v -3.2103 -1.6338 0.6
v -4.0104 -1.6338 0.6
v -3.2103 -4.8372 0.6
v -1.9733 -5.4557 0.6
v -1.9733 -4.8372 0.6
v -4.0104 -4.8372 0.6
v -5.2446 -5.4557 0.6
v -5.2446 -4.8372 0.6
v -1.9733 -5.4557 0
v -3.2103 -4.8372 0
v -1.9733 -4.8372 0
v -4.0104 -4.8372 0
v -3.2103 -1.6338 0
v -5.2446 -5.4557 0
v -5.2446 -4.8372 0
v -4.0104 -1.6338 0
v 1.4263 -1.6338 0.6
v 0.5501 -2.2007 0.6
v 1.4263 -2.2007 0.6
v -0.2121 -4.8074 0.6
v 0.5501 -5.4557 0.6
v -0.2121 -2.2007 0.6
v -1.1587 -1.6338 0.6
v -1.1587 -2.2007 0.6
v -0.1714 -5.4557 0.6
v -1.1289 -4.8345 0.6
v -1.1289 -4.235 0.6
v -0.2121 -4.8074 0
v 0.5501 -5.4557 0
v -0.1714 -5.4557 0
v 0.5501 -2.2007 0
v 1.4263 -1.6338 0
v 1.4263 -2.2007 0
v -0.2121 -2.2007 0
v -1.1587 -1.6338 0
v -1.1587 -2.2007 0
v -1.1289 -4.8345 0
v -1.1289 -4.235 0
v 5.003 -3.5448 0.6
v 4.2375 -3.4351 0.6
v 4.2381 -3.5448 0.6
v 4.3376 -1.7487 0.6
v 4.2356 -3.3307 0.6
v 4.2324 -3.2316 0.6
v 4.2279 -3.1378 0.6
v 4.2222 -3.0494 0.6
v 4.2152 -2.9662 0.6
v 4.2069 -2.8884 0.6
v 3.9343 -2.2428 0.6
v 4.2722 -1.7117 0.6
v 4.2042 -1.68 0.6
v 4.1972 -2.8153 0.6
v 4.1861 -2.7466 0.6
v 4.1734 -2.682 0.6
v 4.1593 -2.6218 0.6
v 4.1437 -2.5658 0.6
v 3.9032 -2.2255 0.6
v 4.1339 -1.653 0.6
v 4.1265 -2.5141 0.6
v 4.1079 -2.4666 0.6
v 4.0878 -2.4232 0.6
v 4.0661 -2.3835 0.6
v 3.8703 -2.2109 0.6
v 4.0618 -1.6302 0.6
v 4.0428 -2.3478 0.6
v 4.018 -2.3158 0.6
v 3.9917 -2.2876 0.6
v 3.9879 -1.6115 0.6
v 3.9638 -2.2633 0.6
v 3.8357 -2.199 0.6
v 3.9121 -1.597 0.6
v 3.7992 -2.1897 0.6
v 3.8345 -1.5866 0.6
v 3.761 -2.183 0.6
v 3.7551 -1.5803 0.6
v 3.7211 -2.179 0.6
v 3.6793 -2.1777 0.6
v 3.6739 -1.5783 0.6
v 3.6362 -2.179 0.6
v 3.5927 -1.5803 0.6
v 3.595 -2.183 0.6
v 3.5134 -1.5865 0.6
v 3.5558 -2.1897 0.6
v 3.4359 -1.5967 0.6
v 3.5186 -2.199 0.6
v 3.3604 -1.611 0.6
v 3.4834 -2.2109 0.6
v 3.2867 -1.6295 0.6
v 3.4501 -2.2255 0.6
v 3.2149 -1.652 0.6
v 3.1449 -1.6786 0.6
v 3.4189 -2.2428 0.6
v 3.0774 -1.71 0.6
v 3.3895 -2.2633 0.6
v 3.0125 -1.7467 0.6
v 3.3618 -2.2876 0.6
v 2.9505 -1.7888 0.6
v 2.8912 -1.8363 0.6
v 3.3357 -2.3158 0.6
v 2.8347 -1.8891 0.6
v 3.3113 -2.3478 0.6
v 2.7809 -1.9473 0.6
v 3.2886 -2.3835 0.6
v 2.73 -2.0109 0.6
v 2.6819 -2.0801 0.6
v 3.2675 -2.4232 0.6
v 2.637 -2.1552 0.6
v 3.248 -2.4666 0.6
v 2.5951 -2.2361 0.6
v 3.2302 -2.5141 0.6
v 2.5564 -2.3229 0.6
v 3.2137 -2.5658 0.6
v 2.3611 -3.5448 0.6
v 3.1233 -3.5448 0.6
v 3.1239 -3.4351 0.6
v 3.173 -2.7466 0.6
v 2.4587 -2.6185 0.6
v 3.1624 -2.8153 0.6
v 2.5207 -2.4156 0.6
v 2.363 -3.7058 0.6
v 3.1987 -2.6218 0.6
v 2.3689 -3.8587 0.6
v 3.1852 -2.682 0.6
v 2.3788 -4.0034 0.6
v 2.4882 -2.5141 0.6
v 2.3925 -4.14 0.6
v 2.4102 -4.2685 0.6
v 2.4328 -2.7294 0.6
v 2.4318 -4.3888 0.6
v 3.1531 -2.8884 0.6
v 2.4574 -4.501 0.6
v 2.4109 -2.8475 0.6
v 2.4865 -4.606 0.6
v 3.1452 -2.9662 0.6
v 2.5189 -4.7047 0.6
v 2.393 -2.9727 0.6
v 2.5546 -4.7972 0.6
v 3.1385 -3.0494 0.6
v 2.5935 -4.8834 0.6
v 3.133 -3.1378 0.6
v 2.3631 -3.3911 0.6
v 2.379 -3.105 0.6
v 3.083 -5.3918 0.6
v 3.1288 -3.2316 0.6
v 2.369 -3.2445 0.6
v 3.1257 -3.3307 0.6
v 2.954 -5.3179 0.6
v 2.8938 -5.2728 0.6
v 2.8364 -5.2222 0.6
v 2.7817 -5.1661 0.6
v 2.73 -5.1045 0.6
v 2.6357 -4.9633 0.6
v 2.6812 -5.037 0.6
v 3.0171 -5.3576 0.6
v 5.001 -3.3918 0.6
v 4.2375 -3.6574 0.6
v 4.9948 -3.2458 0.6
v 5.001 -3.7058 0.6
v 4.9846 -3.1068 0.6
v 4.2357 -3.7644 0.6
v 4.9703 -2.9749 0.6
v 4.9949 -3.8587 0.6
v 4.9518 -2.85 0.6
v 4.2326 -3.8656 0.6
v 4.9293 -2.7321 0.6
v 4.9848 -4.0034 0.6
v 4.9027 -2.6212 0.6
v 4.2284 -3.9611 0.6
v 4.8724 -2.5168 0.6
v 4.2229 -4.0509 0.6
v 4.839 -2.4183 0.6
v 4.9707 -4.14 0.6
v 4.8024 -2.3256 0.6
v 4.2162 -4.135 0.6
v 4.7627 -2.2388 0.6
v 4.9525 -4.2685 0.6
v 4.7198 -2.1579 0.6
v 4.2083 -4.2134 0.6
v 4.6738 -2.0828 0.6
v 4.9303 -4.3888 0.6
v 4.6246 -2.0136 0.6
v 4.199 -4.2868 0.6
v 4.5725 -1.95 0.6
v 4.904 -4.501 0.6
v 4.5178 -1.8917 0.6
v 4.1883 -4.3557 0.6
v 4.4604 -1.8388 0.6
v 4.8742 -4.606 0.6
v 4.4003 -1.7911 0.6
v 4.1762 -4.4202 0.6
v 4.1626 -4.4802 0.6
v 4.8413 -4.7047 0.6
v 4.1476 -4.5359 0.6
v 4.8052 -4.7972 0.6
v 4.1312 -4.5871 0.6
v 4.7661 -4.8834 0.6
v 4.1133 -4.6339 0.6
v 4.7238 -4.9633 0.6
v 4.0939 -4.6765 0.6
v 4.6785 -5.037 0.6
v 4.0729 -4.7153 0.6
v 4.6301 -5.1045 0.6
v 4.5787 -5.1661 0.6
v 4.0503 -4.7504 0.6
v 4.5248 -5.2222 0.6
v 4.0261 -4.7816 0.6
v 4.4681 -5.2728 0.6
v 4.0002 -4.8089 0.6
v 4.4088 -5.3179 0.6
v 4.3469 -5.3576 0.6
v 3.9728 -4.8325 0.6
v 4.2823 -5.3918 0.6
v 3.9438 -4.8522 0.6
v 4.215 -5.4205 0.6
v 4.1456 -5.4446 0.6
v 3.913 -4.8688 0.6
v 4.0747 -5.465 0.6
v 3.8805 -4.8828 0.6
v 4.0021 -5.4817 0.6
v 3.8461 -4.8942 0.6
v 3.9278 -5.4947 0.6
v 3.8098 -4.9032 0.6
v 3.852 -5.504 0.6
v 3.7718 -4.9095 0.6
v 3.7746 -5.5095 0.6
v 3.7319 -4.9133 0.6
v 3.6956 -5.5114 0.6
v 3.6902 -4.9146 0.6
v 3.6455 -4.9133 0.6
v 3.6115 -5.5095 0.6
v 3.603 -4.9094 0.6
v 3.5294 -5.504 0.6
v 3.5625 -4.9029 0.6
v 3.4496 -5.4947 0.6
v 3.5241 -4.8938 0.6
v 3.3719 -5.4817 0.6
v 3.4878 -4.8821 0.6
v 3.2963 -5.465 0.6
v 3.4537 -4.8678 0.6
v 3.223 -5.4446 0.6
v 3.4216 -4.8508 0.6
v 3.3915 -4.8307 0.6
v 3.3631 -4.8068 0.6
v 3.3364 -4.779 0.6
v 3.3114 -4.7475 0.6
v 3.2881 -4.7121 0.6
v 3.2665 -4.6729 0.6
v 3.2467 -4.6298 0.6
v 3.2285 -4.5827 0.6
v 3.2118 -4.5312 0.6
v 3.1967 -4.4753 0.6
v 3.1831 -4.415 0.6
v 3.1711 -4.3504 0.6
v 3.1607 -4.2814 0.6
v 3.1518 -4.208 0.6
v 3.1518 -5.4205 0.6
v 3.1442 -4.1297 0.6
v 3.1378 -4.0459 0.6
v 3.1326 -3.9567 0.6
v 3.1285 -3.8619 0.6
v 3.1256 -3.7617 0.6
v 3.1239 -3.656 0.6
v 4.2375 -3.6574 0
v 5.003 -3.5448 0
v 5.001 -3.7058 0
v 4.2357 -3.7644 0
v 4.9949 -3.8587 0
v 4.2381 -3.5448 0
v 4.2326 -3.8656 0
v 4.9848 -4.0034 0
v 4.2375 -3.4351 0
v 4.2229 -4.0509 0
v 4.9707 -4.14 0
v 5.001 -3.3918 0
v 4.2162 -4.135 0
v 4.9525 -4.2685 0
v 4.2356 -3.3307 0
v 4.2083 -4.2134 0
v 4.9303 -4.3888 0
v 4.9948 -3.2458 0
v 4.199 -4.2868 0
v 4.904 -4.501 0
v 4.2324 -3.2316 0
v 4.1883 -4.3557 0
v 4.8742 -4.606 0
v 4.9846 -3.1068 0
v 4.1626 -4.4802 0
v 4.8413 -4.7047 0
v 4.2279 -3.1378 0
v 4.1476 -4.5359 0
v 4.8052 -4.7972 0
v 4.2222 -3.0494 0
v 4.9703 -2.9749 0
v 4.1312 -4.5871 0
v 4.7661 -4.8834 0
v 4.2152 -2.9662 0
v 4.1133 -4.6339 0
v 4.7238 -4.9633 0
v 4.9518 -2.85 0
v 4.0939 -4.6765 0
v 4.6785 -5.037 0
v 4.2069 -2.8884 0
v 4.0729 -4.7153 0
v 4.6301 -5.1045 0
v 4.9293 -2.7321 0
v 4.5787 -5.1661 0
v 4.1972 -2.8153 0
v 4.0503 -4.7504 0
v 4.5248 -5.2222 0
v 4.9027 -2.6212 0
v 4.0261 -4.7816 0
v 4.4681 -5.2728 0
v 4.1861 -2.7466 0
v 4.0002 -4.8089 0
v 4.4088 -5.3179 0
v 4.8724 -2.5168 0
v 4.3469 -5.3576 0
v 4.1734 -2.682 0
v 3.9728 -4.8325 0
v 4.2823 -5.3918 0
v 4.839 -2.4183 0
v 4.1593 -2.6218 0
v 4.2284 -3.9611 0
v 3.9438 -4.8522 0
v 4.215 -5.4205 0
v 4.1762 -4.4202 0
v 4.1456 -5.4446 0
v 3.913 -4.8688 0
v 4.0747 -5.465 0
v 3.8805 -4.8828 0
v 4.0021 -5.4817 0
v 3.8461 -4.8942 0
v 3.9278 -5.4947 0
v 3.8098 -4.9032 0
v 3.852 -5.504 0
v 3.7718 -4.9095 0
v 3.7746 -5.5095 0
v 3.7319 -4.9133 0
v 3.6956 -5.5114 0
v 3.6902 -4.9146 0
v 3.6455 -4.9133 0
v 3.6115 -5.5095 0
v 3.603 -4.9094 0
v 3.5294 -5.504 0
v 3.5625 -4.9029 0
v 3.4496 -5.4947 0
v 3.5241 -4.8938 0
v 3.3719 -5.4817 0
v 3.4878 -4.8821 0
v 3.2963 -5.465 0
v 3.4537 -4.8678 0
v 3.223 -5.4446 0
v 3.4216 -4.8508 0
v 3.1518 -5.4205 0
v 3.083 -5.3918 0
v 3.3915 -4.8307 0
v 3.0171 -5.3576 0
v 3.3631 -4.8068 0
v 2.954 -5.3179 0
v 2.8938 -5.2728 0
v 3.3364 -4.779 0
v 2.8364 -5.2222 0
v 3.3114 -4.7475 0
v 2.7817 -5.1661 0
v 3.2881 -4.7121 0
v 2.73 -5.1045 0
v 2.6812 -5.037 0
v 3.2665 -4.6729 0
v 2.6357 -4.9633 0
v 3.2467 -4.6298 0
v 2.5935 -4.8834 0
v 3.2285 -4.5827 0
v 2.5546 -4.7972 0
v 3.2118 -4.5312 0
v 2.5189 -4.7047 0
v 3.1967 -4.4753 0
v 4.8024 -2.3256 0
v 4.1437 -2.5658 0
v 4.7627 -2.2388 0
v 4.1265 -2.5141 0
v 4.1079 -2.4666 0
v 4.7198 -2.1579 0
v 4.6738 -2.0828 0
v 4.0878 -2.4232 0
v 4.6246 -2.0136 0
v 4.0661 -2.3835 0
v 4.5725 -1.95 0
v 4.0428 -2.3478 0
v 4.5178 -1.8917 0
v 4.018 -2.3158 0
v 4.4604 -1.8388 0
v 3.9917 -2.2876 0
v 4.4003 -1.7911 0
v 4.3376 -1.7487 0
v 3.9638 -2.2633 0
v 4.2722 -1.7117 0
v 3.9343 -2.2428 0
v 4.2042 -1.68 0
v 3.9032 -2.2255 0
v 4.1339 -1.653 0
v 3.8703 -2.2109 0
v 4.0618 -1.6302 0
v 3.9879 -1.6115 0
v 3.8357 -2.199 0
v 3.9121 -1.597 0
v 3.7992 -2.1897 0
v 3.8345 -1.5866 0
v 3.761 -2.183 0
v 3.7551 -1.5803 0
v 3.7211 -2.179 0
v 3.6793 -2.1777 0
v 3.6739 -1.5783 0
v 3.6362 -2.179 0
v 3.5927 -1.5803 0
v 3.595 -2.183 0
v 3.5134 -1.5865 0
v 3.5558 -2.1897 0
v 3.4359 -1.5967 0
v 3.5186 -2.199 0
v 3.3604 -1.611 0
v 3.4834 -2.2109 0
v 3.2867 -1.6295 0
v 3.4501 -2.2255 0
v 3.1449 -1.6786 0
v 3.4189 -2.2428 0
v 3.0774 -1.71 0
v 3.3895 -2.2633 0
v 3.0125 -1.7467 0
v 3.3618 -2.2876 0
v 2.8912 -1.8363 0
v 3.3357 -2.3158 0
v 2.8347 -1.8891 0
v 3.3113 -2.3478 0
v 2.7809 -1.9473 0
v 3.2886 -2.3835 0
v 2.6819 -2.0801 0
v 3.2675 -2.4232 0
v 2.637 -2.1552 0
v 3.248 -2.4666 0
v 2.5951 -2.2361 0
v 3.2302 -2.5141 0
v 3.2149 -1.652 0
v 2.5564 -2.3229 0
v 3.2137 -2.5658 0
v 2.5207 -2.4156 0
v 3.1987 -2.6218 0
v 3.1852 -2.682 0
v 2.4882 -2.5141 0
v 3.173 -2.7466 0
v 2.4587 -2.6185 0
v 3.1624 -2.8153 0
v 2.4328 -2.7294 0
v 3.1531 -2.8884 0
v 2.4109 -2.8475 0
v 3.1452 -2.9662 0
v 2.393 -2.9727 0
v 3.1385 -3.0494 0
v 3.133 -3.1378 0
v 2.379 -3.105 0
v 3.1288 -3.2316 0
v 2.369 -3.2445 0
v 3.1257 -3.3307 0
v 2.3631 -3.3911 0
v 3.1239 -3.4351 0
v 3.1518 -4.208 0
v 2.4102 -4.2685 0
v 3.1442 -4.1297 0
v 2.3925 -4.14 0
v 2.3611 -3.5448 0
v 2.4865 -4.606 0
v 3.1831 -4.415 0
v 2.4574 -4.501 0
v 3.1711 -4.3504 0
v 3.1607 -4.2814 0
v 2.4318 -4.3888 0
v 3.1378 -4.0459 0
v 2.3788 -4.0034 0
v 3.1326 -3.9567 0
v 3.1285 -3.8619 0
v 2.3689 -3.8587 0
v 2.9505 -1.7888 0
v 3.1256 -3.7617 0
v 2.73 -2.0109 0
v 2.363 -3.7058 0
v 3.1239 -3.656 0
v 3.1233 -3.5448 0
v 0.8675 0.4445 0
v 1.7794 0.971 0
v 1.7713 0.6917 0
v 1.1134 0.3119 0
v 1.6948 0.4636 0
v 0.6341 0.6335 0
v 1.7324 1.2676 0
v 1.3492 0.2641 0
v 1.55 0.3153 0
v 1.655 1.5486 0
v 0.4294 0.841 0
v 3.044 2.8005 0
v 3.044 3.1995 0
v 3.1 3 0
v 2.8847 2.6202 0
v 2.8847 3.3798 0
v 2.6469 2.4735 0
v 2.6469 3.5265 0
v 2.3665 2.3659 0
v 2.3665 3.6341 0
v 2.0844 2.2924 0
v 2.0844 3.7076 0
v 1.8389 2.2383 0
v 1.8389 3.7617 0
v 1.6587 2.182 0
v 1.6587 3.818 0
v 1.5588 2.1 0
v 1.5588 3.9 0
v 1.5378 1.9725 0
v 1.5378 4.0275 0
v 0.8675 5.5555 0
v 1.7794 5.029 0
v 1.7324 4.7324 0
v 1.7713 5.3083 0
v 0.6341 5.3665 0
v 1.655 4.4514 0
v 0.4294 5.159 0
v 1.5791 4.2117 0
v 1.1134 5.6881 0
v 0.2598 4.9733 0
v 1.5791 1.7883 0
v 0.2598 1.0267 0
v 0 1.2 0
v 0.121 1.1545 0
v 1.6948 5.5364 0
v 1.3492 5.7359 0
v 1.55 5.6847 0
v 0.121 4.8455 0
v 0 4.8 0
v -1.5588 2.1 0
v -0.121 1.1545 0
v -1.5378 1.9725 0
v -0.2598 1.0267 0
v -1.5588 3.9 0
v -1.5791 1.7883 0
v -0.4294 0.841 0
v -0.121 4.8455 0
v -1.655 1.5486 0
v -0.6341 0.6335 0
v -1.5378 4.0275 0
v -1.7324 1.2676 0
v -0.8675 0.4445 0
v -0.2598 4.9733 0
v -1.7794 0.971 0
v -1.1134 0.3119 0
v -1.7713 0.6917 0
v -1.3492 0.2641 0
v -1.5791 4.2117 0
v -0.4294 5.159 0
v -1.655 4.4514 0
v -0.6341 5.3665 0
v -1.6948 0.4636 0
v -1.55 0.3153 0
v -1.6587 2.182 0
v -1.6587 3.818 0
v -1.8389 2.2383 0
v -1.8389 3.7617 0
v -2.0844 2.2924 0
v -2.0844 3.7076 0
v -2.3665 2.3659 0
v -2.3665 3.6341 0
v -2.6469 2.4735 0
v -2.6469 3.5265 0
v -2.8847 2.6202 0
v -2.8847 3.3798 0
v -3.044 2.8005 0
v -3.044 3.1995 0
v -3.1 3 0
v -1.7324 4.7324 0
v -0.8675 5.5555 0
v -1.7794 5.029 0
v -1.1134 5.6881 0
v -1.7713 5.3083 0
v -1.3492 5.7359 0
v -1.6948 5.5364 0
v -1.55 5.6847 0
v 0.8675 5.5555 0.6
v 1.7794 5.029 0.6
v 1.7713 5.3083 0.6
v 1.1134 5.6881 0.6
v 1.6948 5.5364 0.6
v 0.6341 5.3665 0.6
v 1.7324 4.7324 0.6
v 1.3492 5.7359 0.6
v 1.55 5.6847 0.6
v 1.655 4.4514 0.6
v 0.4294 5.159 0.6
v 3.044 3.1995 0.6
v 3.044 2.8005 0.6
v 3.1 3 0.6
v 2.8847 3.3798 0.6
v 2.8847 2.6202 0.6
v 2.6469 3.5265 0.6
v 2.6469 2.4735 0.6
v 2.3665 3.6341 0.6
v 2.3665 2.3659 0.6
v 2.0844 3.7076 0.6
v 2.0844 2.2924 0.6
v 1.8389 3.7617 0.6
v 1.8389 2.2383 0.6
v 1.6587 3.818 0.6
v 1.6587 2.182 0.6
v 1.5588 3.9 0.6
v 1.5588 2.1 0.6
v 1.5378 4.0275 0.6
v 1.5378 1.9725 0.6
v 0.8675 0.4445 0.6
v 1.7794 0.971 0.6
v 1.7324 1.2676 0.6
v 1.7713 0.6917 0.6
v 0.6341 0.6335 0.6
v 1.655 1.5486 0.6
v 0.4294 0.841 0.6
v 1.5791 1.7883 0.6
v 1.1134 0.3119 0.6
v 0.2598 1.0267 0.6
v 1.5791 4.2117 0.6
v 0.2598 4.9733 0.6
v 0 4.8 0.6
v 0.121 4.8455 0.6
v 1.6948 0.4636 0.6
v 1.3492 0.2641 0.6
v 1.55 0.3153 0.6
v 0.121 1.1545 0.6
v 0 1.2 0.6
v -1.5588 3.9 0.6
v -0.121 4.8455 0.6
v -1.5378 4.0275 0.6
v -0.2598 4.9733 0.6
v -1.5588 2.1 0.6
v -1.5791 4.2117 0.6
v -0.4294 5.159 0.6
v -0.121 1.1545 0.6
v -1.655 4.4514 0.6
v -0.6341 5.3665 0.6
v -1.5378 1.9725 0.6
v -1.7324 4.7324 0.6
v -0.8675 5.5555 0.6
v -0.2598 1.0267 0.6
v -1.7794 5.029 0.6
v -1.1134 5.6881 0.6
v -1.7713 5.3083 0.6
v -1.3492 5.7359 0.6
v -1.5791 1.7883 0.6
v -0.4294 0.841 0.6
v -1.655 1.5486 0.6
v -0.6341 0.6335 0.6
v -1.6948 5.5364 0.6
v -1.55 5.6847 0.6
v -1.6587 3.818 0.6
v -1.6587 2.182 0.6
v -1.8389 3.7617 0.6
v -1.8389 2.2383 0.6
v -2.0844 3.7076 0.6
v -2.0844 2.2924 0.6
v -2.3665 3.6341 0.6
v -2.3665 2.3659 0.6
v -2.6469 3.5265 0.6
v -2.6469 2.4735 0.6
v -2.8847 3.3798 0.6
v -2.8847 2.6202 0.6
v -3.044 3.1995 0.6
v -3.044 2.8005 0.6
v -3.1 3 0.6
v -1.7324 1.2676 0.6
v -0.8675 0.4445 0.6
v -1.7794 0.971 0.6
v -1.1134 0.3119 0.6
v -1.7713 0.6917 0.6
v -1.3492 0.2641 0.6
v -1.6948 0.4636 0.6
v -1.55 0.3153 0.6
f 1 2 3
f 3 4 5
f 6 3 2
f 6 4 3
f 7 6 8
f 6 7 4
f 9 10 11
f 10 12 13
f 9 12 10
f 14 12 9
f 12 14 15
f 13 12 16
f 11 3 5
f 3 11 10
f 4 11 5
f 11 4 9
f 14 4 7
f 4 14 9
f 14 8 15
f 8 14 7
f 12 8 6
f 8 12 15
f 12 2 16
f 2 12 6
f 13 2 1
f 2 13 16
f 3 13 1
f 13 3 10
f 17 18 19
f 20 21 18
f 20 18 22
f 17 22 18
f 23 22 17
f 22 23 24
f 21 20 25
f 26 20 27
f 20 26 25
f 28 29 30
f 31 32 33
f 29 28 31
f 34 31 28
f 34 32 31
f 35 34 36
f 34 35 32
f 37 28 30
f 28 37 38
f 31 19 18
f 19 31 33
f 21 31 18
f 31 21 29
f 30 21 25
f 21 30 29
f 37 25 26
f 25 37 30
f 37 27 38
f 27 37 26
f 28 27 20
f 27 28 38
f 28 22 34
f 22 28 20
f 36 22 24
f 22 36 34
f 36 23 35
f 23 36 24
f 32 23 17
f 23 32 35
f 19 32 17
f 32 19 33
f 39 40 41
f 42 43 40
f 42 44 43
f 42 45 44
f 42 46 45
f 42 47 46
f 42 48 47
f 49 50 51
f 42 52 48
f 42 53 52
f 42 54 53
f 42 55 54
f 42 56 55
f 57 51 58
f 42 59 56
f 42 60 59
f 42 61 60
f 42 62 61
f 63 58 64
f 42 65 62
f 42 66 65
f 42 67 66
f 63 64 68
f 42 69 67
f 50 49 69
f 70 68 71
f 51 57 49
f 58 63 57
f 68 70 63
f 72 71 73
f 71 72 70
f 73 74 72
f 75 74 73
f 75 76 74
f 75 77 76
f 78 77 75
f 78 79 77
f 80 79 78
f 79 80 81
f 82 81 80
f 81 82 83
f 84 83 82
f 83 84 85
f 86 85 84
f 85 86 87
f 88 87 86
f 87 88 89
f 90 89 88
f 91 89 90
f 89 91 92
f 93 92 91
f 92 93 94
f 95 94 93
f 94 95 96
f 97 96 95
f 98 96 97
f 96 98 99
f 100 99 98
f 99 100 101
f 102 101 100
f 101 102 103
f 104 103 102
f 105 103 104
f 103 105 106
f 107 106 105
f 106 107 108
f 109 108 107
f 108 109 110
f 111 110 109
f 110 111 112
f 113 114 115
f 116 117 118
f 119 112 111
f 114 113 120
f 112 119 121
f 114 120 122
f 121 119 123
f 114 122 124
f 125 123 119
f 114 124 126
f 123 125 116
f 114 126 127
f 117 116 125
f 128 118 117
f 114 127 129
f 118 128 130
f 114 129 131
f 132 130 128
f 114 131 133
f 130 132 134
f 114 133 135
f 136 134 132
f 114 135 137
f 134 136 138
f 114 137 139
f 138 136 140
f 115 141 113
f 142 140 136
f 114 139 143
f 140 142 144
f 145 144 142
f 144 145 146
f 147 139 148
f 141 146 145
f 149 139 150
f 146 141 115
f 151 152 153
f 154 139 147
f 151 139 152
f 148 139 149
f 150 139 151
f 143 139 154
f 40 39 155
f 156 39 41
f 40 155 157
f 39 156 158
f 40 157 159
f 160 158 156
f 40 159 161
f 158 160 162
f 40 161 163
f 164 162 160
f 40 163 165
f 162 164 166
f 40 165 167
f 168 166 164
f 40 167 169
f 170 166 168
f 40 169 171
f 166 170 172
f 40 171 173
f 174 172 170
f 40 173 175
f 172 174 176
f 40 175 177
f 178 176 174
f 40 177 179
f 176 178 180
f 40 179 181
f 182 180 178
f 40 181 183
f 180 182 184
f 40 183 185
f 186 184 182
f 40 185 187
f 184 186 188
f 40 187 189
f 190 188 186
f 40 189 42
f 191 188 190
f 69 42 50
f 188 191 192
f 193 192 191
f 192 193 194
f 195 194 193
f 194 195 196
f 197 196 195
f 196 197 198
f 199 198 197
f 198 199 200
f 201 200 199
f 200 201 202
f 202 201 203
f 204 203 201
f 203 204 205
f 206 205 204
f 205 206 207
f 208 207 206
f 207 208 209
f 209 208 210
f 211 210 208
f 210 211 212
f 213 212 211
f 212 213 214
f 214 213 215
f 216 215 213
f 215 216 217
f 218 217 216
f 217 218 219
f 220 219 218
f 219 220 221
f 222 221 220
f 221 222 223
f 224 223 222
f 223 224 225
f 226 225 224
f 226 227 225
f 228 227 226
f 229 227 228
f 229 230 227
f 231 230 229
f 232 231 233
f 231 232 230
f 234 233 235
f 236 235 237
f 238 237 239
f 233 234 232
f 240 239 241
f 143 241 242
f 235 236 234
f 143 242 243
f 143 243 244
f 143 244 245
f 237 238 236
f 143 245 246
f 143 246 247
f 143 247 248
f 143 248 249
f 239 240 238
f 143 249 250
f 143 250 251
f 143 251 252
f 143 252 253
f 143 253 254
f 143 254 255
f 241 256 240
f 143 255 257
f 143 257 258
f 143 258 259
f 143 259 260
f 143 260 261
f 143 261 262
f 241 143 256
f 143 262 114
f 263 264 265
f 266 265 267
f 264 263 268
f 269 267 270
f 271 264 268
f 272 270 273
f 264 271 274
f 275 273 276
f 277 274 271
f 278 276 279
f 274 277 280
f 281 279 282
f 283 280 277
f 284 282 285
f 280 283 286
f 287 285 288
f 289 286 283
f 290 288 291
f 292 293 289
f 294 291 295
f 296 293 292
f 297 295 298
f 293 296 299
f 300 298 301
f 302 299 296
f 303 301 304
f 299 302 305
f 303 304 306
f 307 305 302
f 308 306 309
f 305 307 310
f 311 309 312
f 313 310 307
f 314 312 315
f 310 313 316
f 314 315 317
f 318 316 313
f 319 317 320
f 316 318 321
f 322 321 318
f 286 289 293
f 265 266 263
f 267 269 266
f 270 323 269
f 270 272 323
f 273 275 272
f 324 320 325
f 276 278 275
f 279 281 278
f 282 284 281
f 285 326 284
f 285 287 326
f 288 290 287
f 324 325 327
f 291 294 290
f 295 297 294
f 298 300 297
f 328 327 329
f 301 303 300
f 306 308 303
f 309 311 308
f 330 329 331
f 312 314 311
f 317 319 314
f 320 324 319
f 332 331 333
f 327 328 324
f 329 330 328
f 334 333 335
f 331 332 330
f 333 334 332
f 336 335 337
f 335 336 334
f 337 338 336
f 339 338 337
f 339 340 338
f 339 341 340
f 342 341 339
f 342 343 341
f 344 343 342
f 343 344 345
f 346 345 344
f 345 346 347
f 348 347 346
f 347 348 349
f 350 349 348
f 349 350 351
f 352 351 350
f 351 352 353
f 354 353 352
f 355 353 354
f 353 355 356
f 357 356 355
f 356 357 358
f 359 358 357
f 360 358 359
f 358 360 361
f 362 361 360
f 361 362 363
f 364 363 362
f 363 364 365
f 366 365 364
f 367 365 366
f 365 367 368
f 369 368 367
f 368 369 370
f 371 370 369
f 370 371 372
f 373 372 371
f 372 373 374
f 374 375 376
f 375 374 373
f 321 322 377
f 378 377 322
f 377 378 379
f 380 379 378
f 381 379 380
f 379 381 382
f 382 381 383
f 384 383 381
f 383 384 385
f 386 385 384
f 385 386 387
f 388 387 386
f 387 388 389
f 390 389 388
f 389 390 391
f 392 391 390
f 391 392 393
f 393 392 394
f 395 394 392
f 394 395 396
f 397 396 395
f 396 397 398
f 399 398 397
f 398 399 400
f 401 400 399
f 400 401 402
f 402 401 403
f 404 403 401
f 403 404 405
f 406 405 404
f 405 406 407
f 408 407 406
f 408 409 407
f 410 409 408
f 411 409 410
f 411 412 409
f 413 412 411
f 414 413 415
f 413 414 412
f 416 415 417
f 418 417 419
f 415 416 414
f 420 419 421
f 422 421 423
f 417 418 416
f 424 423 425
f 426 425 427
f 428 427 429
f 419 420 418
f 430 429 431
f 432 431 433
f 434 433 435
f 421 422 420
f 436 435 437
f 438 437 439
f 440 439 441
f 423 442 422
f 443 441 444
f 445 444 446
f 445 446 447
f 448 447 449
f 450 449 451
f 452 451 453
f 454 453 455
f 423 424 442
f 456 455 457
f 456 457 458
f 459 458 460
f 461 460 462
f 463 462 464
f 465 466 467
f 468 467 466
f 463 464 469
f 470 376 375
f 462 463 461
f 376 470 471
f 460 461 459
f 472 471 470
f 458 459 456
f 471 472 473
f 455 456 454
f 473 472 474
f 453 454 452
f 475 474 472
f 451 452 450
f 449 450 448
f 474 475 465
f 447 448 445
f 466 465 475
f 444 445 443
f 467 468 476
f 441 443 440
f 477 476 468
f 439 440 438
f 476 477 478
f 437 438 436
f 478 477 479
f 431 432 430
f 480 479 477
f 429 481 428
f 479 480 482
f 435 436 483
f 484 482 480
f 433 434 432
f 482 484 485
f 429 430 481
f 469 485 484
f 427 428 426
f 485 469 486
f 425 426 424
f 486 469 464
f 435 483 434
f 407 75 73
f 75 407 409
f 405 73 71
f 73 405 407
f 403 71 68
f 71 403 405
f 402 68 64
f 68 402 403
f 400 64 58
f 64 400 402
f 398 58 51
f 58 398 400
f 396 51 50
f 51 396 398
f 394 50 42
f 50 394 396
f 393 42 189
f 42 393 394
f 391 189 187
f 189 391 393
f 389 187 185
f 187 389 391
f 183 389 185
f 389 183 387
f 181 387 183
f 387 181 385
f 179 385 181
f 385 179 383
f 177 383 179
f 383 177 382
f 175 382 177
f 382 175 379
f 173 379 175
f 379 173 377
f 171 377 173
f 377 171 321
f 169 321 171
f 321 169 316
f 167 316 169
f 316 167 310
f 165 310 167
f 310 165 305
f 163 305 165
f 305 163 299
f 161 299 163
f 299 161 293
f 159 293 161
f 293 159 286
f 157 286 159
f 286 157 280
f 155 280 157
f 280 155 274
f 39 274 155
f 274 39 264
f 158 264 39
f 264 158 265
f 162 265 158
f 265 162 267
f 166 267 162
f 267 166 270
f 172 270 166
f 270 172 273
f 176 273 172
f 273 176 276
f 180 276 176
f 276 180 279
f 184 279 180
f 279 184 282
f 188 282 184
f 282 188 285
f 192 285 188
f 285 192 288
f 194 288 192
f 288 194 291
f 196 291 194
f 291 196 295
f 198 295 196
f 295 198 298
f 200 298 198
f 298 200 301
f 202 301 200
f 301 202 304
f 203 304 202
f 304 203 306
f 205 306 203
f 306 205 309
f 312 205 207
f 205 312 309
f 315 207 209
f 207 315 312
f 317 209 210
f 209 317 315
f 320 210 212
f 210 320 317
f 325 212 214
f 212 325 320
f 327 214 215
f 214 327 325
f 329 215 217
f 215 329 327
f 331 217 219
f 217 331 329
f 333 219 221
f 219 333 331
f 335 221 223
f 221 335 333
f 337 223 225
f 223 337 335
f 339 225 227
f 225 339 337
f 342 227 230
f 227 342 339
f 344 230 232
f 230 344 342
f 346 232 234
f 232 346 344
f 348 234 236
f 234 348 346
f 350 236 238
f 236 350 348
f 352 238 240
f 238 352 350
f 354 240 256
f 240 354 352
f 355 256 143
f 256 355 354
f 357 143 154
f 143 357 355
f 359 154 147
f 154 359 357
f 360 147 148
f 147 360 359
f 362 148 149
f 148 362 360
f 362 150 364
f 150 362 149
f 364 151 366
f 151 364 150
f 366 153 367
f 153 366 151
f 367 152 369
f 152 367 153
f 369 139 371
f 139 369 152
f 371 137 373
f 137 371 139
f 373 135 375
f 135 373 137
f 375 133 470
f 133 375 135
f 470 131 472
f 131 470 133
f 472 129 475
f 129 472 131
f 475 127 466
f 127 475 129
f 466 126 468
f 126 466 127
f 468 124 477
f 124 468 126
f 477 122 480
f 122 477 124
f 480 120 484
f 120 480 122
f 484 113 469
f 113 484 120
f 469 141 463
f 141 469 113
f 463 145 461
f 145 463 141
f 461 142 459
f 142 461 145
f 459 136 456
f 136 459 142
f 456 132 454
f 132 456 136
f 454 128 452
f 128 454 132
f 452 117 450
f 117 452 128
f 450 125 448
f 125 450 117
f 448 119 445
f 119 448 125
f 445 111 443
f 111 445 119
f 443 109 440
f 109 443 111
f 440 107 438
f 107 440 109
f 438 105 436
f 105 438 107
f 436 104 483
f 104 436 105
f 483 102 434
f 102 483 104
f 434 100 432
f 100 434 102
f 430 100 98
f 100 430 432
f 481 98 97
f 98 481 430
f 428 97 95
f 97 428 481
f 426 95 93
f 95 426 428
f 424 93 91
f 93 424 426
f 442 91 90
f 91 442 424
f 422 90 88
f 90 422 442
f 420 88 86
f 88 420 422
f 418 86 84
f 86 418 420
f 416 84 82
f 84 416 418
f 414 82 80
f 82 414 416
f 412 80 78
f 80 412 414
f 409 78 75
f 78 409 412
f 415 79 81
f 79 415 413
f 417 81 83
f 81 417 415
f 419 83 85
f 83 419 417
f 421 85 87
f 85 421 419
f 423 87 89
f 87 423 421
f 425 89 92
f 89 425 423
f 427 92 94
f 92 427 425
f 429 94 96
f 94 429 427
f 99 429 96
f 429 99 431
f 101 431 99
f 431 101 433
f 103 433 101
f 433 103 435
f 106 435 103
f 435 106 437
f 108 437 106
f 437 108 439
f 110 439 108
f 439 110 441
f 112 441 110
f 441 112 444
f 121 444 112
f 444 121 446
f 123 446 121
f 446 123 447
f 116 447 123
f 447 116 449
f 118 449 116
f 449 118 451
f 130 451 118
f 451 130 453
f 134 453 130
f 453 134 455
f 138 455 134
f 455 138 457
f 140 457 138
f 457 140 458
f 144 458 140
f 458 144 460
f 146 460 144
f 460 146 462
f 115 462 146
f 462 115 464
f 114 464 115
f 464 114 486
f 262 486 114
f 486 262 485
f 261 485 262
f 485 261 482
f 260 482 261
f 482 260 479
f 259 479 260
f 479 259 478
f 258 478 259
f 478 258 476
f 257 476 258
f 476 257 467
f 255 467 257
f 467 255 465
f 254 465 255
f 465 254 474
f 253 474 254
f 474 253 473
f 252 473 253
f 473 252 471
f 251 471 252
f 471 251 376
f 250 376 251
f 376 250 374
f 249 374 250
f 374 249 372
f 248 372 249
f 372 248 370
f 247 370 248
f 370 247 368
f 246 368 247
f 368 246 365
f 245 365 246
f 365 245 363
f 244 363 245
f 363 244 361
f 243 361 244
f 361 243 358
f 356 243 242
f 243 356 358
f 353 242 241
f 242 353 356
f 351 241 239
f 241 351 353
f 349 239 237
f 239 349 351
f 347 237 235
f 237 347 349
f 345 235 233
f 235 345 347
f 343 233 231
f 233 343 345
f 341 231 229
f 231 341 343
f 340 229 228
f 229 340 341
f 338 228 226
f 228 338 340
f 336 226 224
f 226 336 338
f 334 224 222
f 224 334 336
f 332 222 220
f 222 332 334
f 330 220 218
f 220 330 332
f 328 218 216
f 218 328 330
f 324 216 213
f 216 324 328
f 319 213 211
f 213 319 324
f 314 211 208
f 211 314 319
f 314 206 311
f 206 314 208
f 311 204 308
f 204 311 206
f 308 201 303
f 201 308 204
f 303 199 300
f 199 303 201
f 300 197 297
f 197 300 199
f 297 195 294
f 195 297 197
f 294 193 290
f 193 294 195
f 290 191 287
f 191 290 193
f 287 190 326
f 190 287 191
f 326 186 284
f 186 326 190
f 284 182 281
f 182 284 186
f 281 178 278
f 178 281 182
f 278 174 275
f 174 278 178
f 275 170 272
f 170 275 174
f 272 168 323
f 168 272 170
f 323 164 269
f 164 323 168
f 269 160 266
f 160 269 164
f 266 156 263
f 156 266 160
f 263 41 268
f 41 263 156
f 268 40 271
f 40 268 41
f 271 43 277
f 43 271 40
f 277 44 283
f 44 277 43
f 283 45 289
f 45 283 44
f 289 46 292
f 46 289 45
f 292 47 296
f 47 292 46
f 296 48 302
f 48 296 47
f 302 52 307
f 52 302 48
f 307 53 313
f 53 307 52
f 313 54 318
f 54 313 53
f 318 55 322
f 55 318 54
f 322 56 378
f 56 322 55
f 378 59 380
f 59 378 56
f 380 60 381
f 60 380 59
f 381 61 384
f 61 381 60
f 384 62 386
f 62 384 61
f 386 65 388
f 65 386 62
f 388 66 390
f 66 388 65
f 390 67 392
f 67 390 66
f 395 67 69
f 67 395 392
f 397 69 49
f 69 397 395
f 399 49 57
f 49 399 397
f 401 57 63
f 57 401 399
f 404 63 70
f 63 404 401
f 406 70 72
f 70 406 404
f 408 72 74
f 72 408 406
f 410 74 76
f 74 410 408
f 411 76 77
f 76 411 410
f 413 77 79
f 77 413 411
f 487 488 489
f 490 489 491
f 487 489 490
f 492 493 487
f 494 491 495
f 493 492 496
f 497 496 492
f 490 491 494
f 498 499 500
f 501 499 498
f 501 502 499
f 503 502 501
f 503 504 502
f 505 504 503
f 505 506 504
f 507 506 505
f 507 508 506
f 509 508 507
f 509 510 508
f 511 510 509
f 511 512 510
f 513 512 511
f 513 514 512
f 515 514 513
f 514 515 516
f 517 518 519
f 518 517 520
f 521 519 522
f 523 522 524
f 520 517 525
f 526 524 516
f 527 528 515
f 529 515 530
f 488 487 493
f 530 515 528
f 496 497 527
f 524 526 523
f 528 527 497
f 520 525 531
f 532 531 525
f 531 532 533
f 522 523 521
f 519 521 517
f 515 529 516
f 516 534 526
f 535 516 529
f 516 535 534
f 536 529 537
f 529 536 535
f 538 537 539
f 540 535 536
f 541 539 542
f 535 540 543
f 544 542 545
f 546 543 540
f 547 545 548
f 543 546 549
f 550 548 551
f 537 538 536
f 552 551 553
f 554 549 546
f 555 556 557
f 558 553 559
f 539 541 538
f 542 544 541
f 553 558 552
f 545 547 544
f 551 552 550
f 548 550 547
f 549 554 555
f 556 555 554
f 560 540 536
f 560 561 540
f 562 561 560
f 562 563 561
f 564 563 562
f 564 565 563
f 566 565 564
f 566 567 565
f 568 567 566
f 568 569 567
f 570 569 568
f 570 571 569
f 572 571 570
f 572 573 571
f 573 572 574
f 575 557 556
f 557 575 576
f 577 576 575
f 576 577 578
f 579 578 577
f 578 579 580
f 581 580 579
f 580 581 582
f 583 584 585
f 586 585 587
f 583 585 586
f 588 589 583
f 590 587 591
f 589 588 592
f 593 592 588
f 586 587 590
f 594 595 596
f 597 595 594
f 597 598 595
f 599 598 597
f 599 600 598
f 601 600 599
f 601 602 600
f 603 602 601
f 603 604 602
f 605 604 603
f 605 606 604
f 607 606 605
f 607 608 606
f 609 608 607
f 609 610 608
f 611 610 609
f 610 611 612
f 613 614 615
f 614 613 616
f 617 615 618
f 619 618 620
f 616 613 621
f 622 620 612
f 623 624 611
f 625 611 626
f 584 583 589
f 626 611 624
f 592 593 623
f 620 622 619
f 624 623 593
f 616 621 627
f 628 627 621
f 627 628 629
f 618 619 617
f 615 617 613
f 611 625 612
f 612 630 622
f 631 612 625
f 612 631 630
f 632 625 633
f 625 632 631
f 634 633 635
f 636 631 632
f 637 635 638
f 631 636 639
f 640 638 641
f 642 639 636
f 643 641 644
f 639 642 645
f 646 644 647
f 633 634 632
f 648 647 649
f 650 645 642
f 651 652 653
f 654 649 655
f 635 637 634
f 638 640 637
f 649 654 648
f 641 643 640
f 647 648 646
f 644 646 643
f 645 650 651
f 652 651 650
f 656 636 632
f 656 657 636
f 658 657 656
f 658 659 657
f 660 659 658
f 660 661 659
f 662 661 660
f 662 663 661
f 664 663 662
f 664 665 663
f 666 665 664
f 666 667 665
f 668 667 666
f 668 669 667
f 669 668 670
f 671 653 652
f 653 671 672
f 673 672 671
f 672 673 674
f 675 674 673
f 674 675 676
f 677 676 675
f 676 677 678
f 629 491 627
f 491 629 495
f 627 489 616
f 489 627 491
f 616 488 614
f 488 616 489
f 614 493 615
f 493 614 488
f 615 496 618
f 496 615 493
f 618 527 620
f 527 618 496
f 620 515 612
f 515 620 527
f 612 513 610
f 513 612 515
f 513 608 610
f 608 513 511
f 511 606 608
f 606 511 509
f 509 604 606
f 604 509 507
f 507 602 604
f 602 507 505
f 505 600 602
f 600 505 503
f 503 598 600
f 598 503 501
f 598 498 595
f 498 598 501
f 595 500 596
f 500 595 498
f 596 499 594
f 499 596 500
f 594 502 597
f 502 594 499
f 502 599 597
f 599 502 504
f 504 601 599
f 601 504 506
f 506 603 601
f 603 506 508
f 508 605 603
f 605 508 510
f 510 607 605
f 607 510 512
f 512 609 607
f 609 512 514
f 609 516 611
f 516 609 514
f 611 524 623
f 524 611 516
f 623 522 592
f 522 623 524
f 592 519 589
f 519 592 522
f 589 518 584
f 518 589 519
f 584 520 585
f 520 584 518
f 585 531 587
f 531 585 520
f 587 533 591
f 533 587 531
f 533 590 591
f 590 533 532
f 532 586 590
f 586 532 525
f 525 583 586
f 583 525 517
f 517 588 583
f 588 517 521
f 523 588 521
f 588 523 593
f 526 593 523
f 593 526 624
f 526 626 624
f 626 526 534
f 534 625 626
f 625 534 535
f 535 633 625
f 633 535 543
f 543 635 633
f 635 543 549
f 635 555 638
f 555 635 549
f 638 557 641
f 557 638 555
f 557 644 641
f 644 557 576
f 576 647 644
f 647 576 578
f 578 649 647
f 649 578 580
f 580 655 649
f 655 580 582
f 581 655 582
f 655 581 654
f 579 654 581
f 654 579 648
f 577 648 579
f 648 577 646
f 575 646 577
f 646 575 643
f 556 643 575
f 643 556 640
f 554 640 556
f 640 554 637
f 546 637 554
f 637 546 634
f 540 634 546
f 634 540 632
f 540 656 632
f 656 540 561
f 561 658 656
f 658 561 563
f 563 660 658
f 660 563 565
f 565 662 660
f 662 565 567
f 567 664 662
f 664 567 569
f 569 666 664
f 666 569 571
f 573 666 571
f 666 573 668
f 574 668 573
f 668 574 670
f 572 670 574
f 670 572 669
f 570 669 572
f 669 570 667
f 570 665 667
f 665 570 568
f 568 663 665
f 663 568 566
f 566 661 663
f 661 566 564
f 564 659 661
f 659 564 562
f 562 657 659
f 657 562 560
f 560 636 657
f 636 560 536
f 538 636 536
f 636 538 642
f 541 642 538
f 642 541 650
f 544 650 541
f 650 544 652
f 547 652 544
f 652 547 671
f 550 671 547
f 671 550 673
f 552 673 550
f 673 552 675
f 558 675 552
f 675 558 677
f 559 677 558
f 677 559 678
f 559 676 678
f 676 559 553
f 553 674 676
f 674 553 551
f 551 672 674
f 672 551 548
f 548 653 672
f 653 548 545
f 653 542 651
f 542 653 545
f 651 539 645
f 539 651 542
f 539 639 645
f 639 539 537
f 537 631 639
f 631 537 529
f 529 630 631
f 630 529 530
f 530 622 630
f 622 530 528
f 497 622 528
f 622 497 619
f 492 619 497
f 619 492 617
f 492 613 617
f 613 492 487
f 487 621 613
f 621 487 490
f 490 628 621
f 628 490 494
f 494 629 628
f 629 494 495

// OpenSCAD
$fn = 50;

difference() {
	union() {
		translate(v = [-3.65, -3.5, 0.6]) {
			rotate(a = [180, 0, 0]) {
				linear_extrude(height = 0.6) {
					text(font = "Liberation Sans:style=Bold", halign = "center", size = 4.0, text = "T", valign = "center");
				}
			}
		}
		translate(v = [0.0, -3.5, 0.6]) {
			rotate(a = [180, 0, 0]) {
				linear_extrude(height = 0.6) {
					text(font = "Liberation Sans:style=Bold", halign = "center", size = 4.0, text = "1", valign = "center");
				}
			}
		}
		translate(v = [3.65, -3.5, 0.6]) {
			rotate(a = [180, 0, 0]) {
				linear_extrude(height = 0.6) {
					text(font = "Liberation Sans:style=Bold", halign = "center", size = 4.0, text = "0", valign = "center");
				}
			}
		}
		translate(v = [0, 3, 0]) {
			linear_extrude(height = 0.6) {
				polygon(points = [[3.1, 0.0], [3.0439902950186117, 0.1995136647114984], [2.8847272103883213, 0.3797815421059436], [2.646888617374527, 0.5264988810722369], [2.3665182744082176, 0.6341066605011758], [2.0844354103556904, 0.7075704773708675], [1.8388718910678303, 0.761685676746956], [1.658746676795018, 0.818003336606089], [1.55884572681199, 0.9], [1.5377850082788151, 1.0275150922444565], [1.5790750912955211, 1.211666933596394], [1.6549917135488983, 1.4513887792304347], [1.7324116139070416, 1.7324116139070416], [1.779405714759903, 2.0290233430980913], [1.7712640685463372, 2.3083562761315313], [1.6947790495515949, 2.5364160920036563], [1.5500000000000005, 2.68467875173176], [1.3492112454670173, 2.735929756715155], [1.1134631418419842, 2.688137818237475], [0.8674829026146248, 2.555522224170328], [0.6341066605011758, 2.3665182744082176], [0.42944369680679173, 2.1589592566013023], [0.2597967997723095, 1.9733526103433505], [0.120961668516203, 1.8455184288505457], [1.102182119232618e-16, 1.8000000000000003], [-0.12096166851620277, 1.8455184288505457], [-0.25979679977230924, 1.9733526103433503], [-0.42944369680679134, 2.158959256601302], [-0.6341066605011755, 2.366518274408217], [-0.8674829026146244, 2.555522224170328], [-1.1134631418419831, 2.688137818237475], [-1.3492112454670169, 2.735929756715155], [-1.5499999999999994, 2.68467875173176], [-1.6947790495515944, 2.536416092003656], [-1.7712640685463372, 2.3083562761315313], [-1.7794057147599032, 2.0290233430980913], [-1.7324116139070418, 1.732411613907042], [-1.6549917135488983, 1.4513887792304352], [-1.5790750912955214, 1.211666933596395], [-1.5377850082788156, 1.0275150922444576], [-1.55884572681199, 0.9], [-1.6587466767950174, 0.8180033366060897], [-1.8388718910678303, 0.7616856767469562], [-2.084435410355689, 0.7075704773708675], [-2.3665182744082154, 0.634106660501176], [-2.646888617374527, 0.5264988810722366], [-2.8847272103883204, 0.37978154210594467], [-3.0439902950186117, 0.1995136647114986], [-3.1, 3.796405077356795e-16], [-3.043990295018612, -0.19951366471149784], [-2.8847272103883213, -0.37978154210594417], [-2.646888617374528, -0.5264988810722362], [-2.366518274408217, -0.6341066605011759], [-2.0844354103556904, -0.7075704773708673], [-1.8388718910678312, -0.7616856767469561], [-1.6587466767950179, -0.8180033366060894], [-1.5588457268119902, -0.8999999999999996], [-1.5377850082788154, -1.0275150922444558], [-1.5790750912955211, -1.211666933596394], [-1.6549917135488978, -1.4513887792304343], [-1.7324116139070413, -1.7324116139070393], [-1.7794057147599032, -2.0290233430980904], [-1.7712640685463374, -2.30835627613153], [-1.6947790495515942, -2.5364160920036567], [-1.5500000000000014, -2.6846787517317594], [-1.349211245467018, -2.7359297567151555], [-1.1134631418419827, -2.688137818237474], [-0.8674829026146252, -2.5555222241703284], [-0.6341066605011755, -2.366518274408217], [-0.42944369680679256, -2.1589592566013027], [-0.2597967997723094, -1.973352610343351], [-0.12096166851620195, -1.8455184288505448], [-3.3065463576978537e-16, -1.8000000000000003], [0.12096166851620122, -1.8455184288505442], [0.2597967997723086, -1.9733526103433503], [0.4294436968067915, -2.1589592566013014], [0.6341066605011743, -2.3665182744082163], [0.8674829026146239, -2.5555222241703275], [1.1134631418419814, -2.688137818237473], [1.3492112454670167, -2.735929756715155], [1.5500000000000005, -2.68467875173176], [1.6947790495515938, -2.536416092003658], [1.7712640685463361, -2.3083562761315344], [1.7794057147599027, -2.0290233430980895], [1.732411613907041, -1.7324116139070416], [1.6549917135488992, -1.451388779230435], [1.5790750912955214, -1.2116669335963952], [1.5377850082788151, -1.0275150922444585], [1.5588457268119893, -0.9000000000000009], [1.658746676795018, -0.8180033366060894], [1.8388718910678303, -0.7616856767469555], [2.084435410355689, -0.7075704773708676], [2.366518274408215, -0.6341066605011774], [2.646888617374524, -0.5264988810722376], [2.8847272103883217, -0.37978154210594395], [3.0439902950186117, -0.1995136647114976]]);
			}
		}
	}
	union();
}
